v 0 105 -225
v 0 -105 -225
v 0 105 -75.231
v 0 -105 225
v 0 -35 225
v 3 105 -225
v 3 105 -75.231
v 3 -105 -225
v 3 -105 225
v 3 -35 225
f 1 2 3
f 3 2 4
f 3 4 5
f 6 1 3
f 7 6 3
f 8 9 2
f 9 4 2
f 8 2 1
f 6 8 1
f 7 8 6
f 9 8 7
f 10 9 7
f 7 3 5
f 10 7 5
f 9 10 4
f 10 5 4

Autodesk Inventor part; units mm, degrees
ref_plane "YZ Plane" through (0, 0, 0) normal (1, 0, 0) x (0, 1, 0)
ref_plane "XZ Plane" through (0, 0, 0) normal (0, 1, 0) x (-1, 0, 0)
ref_plane "XY Plane" through (0, 0, 0) normal (0, 0, 1) x (1, 0, 0)
sketch "スケッチ1" plane through (0, 0, 0) normal (1, 0, 0) x (0, 1, 0)
  line L0 (105, -75.231) -> (-35, 225)
  line L1 (-35, 225) -> (-105, 225)
  line L2 (-105, 225) -> (-105, -225)
  line L3 (-105, -225) -> (105, -225)
  line L4 (105, -225) -> (105, -75.231)
  line L5 (-147, 0) -> (147, 0) projected
  line L6 (0, -315) -> (0, 315) projected
  point P0 (0, 0)
  point P1 (-105, 0)
  point P2 (0, -225)
  dimension "d0" = 70
  dimension "d1" = 450
  dimension "d2" = 210
  dimension "d3" = 25
extrude "押し出し1" add sketch "スケッチ1" along normal blind 3
properties part number "side" material "CFRP"
